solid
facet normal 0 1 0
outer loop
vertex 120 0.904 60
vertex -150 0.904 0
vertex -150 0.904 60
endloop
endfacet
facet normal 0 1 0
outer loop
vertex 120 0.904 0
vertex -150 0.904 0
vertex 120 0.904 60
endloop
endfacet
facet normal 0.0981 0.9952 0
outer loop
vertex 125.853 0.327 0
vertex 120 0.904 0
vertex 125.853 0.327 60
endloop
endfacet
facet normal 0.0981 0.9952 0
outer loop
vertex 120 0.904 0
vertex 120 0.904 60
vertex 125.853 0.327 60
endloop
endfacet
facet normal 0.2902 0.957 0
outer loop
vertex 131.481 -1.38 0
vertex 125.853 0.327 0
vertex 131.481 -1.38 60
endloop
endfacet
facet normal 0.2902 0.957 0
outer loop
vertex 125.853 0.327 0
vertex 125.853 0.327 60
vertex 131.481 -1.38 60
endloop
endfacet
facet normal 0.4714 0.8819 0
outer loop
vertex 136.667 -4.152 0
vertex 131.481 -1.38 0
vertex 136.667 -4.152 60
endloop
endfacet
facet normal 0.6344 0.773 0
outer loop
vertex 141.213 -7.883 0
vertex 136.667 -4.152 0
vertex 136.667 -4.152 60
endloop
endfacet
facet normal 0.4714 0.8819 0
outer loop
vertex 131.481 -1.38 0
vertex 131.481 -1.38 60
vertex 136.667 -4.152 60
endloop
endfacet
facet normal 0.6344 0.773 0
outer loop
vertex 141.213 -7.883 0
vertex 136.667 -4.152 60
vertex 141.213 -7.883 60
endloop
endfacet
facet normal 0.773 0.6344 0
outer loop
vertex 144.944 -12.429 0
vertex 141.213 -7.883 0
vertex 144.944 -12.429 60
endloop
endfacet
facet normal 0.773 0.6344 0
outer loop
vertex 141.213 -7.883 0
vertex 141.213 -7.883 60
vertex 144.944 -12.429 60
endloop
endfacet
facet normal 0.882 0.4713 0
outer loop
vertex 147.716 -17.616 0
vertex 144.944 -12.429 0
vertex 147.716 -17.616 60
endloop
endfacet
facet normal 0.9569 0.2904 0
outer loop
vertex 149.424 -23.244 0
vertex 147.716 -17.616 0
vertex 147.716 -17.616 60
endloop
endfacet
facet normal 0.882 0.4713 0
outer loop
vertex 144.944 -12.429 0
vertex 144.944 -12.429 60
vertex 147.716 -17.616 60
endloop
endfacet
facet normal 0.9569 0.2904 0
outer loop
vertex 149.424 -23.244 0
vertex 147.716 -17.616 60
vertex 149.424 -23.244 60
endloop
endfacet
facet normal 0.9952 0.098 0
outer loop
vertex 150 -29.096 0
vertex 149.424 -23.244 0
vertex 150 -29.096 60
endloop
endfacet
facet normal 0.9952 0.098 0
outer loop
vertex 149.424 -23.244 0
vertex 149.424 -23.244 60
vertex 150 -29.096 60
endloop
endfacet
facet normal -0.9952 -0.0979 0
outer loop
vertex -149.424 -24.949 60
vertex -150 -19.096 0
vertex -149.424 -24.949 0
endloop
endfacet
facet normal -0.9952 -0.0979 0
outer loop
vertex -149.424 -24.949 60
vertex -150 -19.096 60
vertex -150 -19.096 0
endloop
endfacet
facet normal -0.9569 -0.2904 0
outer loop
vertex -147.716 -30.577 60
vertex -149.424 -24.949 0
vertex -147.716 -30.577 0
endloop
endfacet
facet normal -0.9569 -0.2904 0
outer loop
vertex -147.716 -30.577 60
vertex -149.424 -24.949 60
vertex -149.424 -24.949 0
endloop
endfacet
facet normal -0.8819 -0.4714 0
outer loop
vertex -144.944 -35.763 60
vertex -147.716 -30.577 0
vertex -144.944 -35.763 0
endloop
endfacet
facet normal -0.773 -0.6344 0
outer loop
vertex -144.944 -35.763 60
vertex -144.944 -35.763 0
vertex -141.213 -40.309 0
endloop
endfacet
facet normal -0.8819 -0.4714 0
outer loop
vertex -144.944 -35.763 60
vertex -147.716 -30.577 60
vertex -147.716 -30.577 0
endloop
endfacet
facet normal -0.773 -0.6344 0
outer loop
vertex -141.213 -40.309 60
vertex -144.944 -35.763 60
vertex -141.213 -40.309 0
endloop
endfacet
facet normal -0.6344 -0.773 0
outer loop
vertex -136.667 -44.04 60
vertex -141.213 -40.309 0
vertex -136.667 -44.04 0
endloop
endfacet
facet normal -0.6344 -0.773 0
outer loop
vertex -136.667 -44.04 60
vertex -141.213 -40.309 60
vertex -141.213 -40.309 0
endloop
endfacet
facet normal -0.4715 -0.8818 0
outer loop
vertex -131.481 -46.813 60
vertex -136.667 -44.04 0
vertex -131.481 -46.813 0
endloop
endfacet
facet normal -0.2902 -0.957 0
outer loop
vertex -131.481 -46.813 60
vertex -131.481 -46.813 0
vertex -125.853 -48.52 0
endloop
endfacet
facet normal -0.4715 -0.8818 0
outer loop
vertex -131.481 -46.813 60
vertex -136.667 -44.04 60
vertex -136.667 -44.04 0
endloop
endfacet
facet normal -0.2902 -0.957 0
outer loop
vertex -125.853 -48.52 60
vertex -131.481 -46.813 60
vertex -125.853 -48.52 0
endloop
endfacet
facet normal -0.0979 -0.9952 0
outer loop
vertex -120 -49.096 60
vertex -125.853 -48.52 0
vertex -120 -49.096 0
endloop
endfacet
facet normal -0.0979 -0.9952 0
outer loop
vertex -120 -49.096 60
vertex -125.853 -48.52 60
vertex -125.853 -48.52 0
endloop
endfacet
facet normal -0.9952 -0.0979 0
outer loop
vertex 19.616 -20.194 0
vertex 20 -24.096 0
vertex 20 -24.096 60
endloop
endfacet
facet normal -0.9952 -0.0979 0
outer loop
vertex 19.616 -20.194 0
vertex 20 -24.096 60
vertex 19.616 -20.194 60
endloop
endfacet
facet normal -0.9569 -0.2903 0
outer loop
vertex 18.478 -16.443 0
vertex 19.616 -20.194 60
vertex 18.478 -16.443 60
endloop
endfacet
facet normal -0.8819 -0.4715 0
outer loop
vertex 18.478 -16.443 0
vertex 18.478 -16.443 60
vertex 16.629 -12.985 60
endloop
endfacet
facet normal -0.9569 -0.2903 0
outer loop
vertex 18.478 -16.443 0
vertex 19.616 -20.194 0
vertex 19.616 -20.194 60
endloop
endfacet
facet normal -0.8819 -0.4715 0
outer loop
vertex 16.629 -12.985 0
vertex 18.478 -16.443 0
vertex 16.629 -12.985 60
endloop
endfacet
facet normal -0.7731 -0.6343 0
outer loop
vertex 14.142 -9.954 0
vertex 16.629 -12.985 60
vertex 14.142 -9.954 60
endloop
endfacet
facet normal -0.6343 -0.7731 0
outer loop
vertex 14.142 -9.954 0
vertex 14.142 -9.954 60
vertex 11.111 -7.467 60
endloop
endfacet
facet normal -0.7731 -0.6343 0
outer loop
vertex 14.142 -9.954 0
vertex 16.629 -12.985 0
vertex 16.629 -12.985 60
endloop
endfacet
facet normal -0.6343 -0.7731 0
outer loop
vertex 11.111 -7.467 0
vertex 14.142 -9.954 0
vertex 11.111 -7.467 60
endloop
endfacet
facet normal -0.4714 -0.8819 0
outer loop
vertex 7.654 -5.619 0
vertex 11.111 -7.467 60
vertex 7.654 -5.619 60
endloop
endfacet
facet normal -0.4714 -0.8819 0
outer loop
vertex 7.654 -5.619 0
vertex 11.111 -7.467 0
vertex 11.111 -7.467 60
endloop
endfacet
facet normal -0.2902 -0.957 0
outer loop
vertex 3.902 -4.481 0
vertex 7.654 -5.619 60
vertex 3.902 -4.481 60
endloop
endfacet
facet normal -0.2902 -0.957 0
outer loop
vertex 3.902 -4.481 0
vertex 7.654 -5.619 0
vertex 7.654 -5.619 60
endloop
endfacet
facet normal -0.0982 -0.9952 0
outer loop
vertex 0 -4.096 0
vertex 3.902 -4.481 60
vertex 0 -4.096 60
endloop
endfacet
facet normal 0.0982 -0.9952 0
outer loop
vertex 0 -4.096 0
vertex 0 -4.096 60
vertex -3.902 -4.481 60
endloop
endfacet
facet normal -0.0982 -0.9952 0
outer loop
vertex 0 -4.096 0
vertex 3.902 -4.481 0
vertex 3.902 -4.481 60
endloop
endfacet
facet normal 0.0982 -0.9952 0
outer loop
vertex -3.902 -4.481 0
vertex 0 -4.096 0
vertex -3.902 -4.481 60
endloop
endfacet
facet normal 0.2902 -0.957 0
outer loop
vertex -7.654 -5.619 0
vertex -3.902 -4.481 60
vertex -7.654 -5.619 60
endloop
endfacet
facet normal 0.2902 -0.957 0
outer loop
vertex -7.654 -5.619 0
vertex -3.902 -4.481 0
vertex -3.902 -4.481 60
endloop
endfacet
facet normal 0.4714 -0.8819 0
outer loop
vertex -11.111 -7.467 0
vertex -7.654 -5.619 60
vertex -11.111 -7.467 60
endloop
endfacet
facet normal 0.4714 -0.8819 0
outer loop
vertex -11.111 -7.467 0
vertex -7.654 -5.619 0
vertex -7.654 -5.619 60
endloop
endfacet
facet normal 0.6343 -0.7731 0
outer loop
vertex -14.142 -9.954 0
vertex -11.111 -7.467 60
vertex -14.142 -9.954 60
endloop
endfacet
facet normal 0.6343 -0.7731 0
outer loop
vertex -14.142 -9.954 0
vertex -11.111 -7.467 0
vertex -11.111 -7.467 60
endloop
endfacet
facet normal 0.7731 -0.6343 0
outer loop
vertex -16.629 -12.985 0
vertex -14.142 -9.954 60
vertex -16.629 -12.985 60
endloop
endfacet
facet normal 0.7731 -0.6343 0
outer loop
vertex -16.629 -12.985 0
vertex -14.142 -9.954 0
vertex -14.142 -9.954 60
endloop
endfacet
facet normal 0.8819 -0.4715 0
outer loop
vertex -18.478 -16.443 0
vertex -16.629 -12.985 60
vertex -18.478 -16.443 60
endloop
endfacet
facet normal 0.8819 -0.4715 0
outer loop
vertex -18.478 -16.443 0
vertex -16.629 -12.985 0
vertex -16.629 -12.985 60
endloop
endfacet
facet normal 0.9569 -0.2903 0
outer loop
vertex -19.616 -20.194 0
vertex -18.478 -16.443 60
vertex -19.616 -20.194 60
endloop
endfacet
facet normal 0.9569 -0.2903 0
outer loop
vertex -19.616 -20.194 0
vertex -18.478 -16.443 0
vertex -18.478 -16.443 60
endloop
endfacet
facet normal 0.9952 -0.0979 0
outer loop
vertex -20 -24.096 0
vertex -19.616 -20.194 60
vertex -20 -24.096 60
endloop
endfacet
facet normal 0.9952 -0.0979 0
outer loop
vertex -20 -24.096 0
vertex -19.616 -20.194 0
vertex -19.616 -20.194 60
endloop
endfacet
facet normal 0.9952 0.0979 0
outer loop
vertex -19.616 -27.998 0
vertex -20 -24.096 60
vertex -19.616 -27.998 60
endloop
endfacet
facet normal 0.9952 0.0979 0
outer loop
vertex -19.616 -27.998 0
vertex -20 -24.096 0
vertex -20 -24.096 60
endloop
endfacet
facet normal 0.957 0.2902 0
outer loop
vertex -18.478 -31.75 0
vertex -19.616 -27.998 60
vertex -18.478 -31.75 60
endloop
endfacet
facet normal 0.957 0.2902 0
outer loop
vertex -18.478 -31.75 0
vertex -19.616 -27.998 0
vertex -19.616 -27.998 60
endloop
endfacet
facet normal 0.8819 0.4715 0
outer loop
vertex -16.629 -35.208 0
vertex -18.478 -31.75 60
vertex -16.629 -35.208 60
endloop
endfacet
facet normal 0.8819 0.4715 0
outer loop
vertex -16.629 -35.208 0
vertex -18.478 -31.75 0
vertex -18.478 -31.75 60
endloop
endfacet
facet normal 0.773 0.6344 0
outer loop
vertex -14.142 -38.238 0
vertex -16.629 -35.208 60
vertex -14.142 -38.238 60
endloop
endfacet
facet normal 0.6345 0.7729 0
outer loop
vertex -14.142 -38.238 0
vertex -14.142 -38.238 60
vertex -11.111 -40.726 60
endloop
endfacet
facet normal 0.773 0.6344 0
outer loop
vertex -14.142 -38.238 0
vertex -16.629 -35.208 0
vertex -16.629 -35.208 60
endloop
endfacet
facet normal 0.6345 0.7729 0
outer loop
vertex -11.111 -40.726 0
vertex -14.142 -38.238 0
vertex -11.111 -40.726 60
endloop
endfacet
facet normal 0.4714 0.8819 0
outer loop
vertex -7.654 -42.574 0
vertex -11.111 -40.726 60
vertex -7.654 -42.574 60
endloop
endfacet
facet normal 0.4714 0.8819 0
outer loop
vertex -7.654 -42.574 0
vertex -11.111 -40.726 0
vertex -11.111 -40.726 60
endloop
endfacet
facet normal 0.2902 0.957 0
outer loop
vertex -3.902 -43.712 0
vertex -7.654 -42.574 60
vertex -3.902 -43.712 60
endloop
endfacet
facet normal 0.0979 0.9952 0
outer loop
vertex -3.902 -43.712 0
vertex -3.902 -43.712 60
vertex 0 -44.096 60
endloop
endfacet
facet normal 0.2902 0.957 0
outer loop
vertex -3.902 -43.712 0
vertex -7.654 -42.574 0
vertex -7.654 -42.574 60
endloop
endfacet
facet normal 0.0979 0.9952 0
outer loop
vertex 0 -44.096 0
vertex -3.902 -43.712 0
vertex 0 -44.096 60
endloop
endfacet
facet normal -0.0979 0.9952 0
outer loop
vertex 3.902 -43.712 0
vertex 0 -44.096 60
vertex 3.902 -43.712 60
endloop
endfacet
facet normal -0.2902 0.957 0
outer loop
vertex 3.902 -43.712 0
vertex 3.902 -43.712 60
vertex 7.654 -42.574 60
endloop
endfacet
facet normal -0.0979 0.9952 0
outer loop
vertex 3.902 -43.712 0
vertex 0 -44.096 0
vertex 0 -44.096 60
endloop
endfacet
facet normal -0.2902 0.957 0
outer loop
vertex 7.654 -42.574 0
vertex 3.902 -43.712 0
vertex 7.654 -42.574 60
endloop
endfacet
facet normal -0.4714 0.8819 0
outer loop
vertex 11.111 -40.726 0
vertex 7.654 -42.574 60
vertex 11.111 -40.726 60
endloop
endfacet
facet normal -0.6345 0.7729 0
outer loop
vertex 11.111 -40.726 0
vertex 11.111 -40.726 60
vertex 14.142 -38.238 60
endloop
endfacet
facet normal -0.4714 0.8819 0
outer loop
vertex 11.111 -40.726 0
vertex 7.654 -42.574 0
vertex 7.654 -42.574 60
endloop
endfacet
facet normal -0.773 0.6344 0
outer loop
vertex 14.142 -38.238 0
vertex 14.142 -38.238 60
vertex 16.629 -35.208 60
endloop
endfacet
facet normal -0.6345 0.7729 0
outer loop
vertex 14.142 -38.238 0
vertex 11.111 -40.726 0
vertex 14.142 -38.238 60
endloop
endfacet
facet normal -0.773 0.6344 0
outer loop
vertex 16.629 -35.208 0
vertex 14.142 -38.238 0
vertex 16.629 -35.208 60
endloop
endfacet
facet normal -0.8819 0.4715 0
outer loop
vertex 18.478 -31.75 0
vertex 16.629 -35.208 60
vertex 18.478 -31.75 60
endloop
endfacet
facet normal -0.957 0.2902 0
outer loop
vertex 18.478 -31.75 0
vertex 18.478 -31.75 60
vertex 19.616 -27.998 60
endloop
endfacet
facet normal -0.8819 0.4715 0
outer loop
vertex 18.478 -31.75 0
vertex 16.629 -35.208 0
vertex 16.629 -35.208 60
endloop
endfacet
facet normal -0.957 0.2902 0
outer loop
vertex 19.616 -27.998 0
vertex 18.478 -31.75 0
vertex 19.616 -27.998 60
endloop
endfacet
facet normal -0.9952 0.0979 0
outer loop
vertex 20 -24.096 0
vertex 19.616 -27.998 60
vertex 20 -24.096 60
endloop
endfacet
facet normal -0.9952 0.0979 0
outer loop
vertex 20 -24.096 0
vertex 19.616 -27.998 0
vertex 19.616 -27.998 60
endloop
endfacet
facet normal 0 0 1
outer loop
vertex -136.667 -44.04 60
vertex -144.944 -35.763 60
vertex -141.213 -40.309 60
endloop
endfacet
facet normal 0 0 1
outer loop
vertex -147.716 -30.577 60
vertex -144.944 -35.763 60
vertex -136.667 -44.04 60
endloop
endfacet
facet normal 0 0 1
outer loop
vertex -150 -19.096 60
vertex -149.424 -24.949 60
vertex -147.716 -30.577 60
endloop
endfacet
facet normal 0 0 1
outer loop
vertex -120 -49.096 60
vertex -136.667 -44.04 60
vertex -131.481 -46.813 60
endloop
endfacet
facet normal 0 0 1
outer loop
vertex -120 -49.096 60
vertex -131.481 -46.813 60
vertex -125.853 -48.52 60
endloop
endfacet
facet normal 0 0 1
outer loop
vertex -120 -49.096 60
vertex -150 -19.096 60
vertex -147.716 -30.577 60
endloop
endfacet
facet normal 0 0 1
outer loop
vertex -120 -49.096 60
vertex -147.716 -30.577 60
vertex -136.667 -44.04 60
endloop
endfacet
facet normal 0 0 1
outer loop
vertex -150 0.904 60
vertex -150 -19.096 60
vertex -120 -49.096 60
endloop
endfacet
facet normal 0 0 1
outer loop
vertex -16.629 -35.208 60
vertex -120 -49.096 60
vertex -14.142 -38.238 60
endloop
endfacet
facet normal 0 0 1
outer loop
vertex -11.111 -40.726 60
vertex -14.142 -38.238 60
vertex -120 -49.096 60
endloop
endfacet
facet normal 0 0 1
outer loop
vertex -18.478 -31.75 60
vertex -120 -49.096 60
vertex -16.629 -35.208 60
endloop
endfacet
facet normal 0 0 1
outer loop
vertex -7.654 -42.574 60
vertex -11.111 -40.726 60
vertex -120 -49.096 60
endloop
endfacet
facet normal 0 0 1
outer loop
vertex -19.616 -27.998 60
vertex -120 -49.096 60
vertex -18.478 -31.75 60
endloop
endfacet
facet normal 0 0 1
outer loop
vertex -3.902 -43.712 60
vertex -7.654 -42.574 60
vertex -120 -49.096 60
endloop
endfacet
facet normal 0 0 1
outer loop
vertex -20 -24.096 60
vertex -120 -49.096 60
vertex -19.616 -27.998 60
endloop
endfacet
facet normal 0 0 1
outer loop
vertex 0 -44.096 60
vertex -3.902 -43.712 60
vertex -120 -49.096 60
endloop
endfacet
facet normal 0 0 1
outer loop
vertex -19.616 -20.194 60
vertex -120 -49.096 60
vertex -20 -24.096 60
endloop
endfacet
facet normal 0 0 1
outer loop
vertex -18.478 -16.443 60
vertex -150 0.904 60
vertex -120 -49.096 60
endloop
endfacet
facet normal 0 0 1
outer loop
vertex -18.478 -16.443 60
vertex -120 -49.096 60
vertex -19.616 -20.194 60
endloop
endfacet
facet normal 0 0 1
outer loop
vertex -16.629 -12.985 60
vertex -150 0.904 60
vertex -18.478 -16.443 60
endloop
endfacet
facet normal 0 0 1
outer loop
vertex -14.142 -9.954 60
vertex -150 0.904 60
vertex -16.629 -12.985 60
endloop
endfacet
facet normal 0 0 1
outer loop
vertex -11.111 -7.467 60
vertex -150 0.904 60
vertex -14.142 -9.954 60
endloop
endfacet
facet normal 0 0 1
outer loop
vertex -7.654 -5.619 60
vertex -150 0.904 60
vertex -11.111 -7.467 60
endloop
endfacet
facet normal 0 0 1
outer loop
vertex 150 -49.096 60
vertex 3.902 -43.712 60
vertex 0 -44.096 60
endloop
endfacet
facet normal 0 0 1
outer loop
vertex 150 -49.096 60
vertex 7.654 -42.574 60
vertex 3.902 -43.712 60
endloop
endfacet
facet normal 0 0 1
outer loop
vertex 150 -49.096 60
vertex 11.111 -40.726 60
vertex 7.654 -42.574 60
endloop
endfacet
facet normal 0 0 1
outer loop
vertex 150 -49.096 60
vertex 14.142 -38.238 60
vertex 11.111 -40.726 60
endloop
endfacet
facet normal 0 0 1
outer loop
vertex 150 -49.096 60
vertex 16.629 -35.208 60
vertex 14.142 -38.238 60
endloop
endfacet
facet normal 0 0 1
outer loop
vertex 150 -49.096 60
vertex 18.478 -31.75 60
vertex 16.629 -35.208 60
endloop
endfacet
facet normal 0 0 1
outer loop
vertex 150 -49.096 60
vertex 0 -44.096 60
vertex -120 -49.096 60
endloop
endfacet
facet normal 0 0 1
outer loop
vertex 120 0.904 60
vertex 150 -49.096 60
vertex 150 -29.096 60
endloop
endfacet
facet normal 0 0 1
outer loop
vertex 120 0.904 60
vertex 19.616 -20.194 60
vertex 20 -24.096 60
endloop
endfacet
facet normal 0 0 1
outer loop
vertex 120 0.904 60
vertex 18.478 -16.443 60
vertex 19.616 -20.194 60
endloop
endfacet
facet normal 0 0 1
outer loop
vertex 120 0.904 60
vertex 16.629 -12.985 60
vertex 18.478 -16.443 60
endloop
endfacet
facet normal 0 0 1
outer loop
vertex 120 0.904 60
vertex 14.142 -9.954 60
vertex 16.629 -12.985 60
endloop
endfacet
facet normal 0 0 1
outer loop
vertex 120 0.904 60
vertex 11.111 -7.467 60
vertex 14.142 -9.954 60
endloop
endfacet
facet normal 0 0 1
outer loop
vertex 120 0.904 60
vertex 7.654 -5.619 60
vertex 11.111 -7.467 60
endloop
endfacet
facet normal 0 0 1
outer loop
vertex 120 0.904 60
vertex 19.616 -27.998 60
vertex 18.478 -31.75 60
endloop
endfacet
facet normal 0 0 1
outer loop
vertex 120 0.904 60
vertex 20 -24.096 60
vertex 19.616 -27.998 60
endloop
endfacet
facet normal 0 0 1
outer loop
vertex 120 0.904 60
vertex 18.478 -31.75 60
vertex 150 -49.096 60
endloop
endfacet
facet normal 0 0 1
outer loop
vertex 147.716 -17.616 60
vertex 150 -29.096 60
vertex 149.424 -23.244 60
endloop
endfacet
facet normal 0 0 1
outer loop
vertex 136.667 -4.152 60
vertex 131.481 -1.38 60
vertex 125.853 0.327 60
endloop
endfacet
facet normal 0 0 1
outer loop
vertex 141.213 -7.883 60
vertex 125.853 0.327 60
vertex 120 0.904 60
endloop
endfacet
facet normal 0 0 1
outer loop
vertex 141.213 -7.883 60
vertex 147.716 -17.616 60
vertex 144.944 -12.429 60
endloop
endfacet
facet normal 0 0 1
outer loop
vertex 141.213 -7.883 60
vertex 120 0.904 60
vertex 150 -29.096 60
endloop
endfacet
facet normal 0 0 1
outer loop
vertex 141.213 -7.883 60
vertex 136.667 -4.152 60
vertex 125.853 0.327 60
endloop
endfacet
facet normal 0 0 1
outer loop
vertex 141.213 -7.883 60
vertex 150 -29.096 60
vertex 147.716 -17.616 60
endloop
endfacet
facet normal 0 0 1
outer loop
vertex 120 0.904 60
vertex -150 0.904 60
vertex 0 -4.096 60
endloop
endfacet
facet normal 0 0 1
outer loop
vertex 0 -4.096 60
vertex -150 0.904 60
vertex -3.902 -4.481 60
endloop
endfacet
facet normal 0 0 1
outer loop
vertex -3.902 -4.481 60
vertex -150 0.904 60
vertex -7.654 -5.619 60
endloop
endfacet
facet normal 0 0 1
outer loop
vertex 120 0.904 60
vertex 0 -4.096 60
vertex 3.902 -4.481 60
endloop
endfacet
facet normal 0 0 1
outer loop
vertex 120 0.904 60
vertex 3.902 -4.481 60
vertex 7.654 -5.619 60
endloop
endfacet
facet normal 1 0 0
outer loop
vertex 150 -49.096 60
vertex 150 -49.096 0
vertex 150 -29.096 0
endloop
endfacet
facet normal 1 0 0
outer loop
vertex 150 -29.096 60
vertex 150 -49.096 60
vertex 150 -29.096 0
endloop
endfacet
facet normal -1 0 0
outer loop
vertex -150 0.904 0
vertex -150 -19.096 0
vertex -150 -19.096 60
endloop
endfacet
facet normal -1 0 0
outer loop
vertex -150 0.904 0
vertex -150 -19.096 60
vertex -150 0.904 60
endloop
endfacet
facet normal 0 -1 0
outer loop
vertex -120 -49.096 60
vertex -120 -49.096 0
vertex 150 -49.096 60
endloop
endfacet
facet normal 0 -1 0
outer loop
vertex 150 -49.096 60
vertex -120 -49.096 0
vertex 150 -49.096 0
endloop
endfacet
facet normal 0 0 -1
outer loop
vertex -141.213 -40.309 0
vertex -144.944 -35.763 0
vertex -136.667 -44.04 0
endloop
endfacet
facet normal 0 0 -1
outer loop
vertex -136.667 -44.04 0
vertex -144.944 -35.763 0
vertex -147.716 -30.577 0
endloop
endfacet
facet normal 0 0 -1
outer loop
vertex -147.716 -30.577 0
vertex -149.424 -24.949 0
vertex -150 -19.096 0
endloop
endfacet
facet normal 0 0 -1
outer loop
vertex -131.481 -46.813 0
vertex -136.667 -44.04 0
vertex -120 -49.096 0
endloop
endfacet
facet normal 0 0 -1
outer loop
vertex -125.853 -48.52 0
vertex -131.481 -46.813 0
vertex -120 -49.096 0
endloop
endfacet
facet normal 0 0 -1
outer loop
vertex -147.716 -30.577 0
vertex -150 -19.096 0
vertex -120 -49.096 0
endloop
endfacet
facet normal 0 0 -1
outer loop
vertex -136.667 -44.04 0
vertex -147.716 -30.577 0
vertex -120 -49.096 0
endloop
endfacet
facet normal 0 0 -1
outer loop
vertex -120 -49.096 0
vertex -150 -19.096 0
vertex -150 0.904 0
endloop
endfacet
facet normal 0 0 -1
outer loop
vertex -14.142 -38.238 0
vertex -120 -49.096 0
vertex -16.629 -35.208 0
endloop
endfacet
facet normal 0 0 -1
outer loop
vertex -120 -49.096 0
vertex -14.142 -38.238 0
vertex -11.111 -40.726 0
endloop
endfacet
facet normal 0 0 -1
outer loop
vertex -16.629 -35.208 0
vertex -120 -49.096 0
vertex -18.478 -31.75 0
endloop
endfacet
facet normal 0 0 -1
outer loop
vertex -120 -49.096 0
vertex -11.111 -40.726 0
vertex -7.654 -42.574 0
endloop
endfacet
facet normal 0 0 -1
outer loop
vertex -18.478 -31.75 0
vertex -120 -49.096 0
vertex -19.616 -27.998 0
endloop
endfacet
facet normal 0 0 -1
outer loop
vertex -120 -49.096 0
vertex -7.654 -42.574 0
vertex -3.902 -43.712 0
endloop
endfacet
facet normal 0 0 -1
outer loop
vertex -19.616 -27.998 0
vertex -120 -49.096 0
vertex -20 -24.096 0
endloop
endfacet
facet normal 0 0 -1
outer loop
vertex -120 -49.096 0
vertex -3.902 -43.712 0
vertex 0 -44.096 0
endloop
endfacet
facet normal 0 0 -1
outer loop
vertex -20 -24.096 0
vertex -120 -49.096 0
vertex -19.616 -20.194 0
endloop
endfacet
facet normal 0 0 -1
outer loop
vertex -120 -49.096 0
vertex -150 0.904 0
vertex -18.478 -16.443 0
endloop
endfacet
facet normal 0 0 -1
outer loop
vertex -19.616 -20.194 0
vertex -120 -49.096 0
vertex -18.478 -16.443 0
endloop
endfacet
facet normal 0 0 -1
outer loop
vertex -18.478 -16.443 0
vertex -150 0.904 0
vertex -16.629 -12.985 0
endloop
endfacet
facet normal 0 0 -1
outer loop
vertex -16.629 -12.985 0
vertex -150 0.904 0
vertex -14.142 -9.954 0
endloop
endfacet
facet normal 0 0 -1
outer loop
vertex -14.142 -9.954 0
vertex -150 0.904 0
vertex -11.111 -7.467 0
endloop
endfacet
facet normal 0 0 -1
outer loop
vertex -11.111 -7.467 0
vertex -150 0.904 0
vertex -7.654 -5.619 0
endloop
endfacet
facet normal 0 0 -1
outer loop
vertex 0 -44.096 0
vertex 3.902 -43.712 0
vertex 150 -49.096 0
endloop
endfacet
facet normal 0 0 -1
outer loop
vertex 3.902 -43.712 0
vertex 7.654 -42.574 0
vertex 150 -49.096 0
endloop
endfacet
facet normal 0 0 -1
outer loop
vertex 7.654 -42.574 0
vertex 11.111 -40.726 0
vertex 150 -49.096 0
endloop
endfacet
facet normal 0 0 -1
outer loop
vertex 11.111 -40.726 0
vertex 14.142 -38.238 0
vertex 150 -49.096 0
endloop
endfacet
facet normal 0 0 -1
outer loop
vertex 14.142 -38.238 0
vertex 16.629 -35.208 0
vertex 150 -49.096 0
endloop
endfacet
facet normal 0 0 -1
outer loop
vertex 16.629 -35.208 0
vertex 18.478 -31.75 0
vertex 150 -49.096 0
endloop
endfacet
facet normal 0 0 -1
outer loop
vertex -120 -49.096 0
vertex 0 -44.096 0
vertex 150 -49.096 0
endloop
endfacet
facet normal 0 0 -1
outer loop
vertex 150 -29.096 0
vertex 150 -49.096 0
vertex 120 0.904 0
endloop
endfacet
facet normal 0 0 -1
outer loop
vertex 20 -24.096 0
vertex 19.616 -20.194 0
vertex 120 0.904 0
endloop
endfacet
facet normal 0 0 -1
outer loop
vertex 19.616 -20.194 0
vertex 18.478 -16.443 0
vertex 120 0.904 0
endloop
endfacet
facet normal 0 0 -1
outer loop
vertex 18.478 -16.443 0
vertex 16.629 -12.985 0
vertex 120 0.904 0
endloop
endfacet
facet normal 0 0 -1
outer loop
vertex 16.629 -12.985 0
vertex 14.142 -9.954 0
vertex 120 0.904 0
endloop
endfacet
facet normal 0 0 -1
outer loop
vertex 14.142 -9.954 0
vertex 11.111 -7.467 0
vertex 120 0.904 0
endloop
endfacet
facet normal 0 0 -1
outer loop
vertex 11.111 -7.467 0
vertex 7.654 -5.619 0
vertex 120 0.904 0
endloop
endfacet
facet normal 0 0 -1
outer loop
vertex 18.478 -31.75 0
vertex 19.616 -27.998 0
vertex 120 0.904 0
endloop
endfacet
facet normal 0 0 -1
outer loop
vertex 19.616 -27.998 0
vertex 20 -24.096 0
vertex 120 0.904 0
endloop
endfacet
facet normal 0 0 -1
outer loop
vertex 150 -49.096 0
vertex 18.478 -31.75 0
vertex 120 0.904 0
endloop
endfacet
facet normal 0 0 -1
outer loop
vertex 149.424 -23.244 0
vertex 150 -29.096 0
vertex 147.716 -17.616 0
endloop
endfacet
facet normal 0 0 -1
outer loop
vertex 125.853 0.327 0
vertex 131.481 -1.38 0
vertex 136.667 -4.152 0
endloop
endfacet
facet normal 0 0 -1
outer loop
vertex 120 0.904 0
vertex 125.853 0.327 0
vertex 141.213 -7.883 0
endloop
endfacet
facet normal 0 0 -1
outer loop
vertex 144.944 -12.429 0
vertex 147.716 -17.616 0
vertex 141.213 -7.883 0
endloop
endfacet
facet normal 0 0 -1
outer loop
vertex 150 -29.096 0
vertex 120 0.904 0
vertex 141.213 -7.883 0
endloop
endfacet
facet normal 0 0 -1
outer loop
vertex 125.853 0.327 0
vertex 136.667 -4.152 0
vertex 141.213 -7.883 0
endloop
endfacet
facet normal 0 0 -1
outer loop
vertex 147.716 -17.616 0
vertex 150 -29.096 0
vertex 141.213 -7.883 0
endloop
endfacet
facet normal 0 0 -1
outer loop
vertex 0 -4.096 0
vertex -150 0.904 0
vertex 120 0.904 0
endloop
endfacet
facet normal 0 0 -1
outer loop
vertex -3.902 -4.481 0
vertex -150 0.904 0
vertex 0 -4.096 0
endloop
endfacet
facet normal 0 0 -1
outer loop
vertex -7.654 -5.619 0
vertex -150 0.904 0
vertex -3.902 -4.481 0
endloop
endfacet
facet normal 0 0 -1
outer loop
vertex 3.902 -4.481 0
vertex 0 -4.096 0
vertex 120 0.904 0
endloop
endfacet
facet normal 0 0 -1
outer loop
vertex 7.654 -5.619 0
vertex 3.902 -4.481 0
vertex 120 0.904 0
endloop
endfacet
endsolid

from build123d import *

# Parameters (mm, degrees)
F0_W     = 300
F0_H     = 50
F0_R     = 20
F1_DEPTH = 60
F2_R     = 30


with BuildPart() as f1:
    # F0 (on Top) → F1 (new body)
    with BuildSketch(Plane.XY):
        with Locations((0, -24.096213)):
            Rectangle(F0_W, F0_H)
        with Locations((0, -24.096213)):
            Circle(F0_R, mode=Mode.SUBTRACT)
    extrude(amount=F1_DEPTH)

    # F2
    f2_edges = [f1.edges().sort_by_distance(p)[0] for p in [
        (-150, -49.096213, 30),
        (150, 0.903787, 30),
    ]]
    fillet(f2_edges, radius=F2_R)


solid = f1.part
